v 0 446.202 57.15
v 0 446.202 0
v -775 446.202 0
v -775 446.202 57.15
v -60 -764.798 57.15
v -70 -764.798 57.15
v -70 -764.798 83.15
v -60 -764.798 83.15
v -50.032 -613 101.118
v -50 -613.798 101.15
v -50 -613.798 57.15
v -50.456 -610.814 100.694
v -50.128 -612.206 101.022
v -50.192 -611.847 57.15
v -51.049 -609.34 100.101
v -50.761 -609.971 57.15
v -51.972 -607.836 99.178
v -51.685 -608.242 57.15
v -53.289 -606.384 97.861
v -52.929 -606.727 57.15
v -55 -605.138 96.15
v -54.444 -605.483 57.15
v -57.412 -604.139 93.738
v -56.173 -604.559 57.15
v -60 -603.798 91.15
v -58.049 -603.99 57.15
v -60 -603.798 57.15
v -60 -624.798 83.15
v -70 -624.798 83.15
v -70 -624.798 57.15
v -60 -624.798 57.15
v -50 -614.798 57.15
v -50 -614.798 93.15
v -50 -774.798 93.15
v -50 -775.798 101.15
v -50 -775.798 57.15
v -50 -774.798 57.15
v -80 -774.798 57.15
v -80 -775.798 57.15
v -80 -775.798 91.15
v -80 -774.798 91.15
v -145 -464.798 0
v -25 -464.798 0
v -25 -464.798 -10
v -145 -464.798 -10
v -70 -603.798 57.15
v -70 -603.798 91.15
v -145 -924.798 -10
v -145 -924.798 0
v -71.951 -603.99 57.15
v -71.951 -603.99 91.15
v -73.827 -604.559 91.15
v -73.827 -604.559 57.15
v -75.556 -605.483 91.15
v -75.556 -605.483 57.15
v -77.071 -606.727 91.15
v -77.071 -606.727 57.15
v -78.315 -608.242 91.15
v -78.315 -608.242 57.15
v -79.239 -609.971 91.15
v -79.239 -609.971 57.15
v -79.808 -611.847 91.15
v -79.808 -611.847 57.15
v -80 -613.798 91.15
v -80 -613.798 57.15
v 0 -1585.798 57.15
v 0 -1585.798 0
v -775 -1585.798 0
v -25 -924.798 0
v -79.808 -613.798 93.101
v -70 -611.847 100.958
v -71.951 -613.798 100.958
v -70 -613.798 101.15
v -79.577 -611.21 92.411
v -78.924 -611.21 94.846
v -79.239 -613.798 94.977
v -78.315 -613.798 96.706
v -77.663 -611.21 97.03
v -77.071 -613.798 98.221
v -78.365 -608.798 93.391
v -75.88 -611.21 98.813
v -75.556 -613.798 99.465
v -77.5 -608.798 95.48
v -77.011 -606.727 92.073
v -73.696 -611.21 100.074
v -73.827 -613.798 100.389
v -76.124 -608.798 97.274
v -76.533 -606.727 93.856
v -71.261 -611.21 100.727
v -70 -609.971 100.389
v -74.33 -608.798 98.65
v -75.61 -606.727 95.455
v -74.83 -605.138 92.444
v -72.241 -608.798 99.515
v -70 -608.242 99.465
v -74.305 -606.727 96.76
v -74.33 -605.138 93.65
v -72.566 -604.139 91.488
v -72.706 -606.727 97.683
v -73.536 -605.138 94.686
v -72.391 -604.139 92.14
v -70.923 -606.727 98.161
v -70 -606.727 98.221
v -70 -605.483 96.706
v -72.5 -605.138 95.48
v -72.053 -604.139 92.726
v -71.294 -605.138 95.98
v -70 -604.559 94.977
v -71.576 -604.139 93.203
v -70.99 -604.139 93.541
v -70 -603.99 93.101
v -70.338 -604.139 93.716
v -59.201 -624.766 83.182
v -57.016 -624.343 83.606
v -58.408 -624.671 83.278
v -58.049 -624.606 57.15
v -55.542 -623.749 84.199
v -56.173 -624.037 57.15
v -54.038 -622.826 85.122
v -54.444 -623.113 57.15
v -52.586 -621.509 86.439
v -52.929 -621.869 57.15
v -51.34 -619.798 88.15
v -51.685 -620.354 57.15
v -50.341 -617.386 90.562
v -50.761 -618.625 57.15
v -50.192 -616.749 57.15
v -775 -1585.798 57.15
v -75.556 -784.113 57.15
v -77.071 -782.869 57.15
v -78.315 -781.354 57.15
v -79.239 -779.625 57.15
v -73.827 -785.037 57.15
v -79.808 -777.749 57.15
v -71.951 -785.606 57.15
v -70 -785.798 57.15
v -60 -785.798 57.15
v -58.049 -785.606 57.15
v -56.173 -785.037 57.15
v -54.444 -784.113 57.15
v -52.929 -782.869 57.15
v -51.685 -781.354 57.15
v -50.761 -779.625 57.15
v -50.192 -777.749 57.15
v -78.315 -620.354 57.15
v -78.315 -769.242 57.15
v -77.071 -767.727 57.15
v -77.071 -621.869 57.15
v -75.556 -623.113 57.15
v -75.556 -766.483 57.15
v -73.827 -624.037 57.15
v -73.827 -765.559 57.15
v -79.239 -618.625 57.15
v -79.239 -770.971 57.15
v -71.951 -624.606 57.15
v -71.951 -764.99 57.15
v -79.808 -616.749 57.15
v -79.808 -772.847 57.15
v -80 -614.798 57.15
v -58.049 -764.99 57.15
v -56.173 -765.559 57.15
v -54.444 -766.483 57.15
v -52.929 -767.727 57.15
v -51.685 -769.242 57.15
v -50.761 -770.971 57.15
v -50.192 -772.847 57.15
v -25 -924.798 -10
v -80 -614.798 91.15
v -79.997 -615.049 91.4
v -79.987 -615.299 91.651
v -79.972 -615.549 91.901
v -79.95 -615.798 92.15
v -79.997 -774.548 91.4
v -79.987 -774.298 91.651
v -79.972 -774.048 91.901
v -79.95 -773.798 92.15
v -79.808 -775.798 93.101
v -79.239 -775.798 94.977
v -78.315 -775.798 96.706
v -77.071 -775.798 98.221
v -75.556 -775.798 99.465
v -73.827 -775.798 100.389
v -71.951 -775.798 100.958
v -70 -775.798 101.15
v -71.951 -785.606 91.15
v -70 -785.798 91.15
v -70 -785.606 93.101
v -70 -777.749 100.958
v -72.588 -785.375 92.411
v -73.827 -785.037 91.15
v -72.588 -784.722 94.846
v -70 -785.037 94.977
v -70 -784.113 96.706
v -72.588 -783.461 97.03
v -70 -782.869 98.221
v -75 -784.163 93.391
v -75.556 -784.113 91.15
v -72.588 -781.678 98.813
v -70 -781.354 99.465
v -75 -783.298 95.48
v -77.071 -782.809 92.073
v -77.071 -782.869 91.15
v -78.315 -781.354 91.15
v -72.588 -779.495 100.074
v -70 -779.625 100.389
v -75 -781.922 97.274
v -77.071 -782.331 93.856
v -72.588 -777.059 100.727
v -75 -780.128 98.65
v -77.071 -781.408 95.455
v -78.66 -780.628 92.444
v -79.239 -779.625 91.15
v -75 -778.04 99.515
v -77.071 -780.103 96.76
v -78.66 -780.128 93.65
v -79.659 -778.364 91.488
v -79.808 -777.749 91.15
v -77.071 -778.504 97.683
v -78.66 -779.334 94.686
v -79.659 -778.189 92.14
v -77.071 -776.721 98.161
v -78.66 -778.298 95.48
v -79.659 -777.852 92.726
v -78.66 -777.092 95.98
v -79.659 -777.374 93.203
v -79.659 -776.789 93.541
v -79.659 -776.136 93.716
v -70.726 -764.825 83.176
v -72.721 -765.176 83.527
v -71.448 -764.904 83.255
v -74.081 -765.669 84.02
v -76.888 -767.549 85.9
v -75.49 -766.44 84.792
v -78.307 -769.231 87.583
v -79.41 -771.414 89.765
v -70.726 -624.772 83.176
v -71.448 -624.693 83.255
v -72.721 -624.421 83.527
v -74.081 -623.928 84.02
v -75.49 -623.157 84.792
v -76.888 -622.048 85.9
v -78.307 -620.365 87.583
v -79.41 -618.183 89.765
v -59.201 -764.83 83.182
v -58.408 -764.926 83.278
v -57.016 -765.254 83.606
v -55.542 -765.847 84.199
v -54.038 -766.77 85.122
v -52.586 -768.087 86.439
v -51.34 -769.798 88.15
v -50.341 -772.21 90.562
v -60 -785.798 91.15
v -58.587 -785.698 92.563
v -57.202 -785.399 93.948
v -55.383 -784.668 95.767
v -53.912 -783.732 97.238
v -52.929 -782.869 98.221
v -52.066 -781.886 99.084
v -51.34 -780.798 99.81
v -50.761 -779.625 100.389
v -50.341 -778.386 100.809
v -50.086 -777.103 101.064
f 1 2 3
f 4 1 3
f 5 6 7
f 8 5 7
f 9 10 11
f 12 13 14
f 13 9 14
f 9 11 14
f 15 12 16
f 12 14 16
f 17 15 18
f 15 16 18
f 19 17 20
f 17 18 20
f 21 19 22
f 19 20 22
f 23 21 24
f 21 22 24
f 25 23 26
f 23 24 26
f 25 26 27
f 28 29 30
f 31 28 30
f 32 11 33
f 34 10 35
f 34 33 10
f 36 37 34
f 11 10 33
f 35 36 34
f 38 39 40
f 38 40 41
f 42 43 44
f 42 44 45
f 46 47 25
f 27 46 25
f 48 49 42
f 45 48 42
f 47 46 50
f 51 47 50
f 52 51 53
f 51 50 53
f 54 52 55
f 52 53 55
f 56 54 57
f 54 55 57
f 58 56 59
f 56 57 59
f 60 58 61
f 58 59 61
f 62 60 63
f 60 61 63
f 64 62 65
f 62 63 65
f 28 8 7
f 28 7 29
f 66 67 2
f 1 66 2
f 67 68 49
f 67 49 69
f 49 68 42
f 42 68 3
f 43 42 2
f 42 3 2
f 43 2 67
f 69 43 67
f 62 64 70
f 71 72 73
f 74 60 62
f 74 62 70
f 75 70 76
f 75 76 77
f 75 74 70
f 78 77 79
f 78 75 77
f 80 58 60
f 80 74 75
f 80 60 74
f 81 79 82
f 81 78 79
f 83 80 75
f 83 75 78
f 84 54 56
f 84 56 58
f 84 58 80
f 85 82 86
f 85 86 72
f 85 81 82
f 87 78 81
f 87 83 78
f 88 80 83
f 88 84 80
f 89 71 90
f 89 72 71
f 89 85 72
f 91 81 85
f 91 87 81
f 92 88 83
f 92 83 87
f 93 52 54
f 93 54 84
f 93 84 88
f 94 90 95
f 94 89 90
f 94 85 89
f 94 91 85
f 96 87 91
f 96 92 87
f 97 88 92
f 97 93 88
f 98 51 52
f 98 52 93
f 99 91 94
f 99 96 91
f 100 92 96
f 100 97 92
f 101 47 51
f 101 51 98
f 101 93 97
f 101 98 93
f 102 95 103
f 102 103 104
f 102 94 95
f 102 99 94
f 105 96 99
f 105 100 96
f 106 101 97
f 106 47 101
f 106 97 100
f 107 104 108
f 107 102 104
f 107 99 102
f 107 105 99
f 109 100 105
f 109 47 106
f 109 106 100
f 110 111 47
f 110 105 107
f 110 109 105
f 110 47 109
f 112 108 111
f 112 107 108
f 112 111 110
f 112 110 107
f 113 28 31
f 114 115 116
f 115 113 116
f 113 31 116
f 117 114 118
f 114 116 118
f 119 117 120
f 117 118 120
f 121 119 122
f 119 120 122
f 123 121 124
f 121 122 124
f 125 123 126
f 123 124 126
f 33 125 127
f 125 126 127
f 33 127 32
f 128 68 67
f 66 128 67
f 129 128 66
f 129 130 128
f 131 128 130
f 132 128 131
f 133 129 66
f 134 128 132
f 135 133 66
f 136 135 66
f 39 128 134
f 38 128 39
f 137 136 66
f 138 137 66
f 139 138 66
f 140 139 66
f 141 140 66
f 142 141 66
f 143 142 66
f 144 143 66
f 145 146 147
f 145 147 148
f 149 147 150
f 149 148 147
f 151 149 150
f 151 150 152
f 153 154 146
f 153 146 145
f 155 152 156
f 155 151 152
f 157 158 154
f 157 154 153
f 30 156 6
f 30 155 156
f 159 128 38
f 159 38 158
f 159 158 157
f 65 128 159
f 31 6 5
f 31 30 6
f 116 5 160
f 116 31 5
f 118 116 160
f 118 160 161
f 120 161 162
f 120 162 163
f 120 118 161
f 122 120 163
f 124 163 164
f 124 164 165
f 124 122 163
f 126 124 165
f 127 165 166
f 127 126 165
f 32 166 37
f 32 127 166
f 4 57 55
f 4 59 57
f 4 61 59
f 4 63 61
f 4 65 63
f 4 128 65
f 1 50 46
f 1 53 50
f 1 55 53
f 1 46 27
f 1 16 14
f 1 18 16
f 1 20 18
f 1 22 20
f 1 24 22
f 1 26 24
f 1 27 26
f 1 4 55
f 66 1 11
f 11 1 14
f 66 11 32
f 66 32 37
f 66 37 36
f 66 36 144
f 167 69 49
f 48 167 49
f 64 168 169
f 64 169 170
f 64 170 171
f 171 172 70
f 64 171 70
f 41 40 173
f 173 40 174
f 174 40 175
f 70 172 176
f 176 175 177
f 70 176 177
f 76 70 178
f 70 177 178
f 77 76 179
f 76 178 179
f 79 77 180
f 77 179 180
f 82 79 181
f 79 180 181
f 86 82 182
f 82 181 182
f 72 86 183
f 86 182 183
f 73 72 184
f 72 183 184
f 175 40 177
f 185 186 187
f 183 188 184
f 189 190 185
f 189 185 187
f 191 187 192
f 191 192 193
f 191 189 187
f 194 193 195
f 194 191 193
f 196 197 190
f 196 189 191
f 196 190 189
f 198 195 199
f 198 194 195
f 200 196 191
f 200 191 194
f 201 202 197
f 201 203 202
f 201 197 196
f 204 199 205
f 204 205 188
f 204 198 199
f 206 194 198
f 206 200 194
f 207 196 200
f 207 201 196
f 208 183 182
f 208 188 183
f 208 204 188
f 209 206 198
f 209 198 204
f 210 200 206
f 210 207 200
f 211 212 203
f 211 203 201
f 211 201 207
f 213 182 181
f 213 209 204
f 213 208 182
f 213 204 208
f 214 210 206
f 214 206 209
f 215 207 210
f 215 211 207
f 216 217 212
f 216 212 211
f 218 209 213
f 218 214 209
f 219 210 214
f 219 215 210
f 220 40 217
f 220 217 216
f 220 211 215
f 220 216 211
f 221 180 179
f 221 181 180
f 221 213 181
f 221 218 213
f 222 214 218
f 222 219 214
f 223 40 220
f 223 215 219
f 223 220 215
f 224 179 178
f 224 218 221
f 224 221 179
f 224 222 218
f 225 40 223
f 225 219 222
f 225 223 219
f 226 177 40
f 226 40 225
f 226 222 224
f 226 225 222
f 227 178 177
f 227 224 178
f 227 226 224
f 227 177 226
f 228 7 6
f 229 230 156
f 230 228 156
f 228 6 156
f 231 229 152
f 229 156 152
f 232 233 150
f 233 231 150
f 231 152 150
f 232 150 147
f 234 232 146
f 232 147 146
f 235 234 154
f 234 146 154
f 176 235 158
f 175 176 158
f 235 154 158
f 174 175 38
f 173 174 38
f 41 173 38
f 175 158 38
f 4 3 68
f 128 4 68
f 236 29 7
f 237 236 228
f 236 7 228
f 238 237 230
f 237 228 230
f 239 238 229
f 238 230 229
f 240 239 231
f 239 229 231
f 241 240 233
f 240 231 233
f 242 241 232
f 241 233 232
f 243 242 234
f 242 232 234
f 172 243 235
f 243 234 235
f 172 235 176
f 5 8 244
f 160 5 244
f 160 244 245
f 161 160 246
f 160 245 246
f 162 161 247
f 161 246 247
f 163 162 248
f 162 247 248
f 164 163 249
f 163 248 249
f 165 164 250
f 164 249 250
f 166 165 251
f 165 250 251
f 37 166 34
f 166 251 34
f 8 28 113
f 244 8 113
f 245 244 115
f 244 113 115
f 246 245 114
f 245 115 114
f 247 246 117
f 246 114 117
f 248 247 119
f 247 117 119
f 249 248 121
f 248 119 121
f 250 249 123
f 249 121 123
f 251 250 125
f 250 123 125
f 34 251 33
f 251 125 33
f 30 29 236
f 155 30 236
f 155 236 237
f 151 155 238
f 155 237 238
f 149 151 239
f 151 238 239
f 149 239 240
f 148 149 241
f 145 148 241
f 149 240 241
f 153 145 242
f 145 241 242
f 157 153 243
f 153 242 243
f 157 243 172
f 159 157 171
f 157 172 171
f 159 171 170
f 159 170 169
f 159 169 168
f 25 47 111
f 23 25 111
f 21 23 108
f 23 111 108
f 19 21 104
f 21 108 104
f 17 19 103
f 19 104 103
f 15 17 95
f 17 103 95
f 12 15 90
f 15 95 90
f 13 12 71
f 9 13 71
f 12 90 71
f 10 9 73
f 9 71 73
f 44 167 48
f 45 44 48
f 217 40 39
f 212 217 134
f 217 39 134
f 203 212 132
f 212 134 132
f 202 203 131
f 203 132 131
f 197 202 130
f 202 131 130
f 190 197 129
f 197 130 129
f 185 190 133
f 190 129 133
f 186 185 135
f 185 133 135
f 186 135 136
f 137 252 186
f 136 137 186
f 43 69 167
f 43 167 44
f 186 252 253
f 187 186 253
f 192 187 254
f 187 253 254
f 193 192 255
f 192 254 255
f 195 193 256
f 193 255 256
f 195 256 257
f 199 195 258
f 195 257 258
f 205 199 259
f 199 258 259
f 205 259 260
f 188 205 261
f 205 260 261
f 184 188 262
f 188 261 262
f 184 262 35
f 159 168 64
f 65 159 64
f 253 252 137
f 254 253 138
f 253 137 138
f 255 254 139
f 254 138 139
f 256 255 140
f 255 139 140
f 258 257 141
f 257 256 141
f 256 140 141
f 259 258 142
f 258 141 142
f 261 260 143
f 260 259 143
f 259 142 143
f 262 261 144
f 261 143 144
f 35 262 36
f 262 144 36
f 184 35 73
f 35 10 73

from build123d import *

# Parameters (mm, degrees)
BOSS_EXTRUDE2_DEPTH = 57.15
BOSS_EXTRUDE3_DEPTH = 44
CUT_EXTRUDE1_DEPTH  = 44
FILLET1_R           = 10
SKETCH6_W           = 120
SKETCH6_H           = 460.0000000000001
BOSS_EXTRUDE4_DEPTH = 10


with BuildPart() as part:
    # Sketch1 → Boss-Extrude2 (new body)
    with BuildSketch(Plane.XY):
        Polygon((0, 0), (0, 446.2018372120283), (-775, 446.2018372120282), (-774.9999999999995, -1585.7981627879717), (0, -1585.7981627879717), align=None)
    extrude(amount=BOSS_EXTRUDE2_DEPTH)

    # Sketch4 → Boss-Extrude3 (add)
    with BuildSketch(Plane.XY.offset(57.15)):
        Polygon((-79.99999999999993, -603.7981627879718), (-49.999999999999936, -603.7981627879718), (-49.999999999999915, -785.7981627879718), (-79.9999999999999, -785.7981627879718), align=None)
    extrude(amount=BOSS_EXTRUDE3_DEPTH)

    # Sketch5 → Cut-Extrude1 (cut)
    with BuildSketch(Plane.ZY.offset(80.00000000000003)):
        Polygon((83.14999999999999, -624.7981627879717), (57.150000000000006, -624.7981627879717), (57.15, -764.7981627879717), (83.15, -764.7981627879717), align=None)
    extrude(amount=-CUT_EXTRUDE1_DEPTH, mode=Mode.SUBTRACT)

    # Fillet1
    # the kernel refuses this fillet: 10 mm, written as the material it takes off along each edge
    with BuildSketch(Plane(origin=(-69.99999999999993, -613.7981627879718, 91.15), x_dir=(-1, -1.6e-16, 0), z_dir=(0, 1, 0))) as fillet1_piece_1_section:
        Polygon((0, 0), (FILLET1_R, 0), (FILLET1_R, FILLET1_R), (0, FILLET1_R), align=None)
    fillet1_piece_1 = extrude(amount=FILLET1_R, mode=Mode.PRIVATE)
    fillet1_piece_1 = fillet1_piece_1 - Plane(origin=(-69.99999999999993, -613.7981627879718, 91.15), x_dir=(0.7071067811865475, 0, -0.7071067811865475), z_dir=(0, 1, 0)) * Sphere(FILLET1_R, mode=Mode.PRIVATE)
    add(fillet1_piece_1, mode=Mode.SUBTRACT)
    with BuildSketch(Plane(origin=(-69.9999999999999, -775.7981627879718, 91.15), x_dir=(0, 0, 1), z_dir=(-1, -1.6e-16, 0))) as fillet1_piece_2_section:
        Polygon((0, 0), (FILLET1_R, 0), (FILLET1_R, -FILLET1_R), (0, -FILLET1_R), align=None)
    fillet1_piece_2 = extrude(amount=FILLET1_R, mode=Mode.PRIVATE)
    fillet1_piece_2 = fillet1_piece_2 - Plane(origin=(-69.9999999999999, -775.7981627879718, 91.15), x_dir=(0, 0.7071067811865475, -0.7071067811865475), z_dir=(-1, -1.6e-16, 0)) * Sphere(FILLET1_R, mode=Mode.PRIVATE)
    add(fillet1_piece_2, mode=Mode.SUBTRACT)
    with BuildSketch(Plane(origin=(-49.999999999999915, -785.7981627879718, 57.15), x_dir=(-1, 0, 0), z_dir=(0, 0, 1))) as fillet1_piece_3:
        with BuildLine():
            CenterArc((FILLET1_R, -FILLET1_R), FILLET1_R, 90, 90)
            Line((0, -FILLET1_R), (0, 0))
            Line((0, 0), (FILLET1_R, 0))
        make_face()
    extrude(amount=69, mode=Mode.SUBTRACT)
    with BuildSketch(Plane(origin=(-49.999999999999936, -603.7981627879718, 57.15), x_dir=(0, -1, 0), z_dir=(0, 0, 1))) as fillet1_piece_4:
        with BuildLine():
            CenterArc((FILLET1_R, -FILLET1_R), FILLET1_R, 90, 90)
            Line((0, -FILLET1_R), (0, 0))
            Line((0, 0), (FILLET1_R, 0))
        make_face()
    extrude(amount=69, mode=Mode.SUBTRACT)
    with BuildSketch(Plane(origin=(-79.99999999999993, -603.7981627879718, 57.15), x_dir=(1, 0, 0), z_dir=(0, 0, 1))) as fillet1_piece_5:
        with BuildLine():
            CenterArc((FILLET1_R, -FILLET1_R), FILLET1_R, 90, 90)
            Line((0, -FILLET1_R), (0, 0))
            Line((0, 0), (FILLET1_R, 0))
        make_face()
    extrude(amount=34.00000000000001, mode=Mode.SUBTRACT)
    with BuildSketch(Plane(origin=(-79.9999999999999, -785.7981627879718, 57.15), x_dir=(1, 0, 0), z_dir=(0, 0, 1))) as fillet1_piece_6:
        with BuildLine():
            CenterArc((FILLET1_R, FILLET1_R), FILLET1_R, 180, 90)
            Line((0, FILLET1_R), (0, 0))
            Line((0, 0), (FILLET1_R, 0))
        make_face()
    extrude(amount=34.00000000000001, mode=Mode.SUBTRACT)
    with BuildSketch(Plane(origin=(-69.99999999999993, -603.7981627879718, 101.15), x_dir=(0, 0, -1), z_dir=(1, 0, 0))) as fillet1_piece_7:
        with BuildLine():
            CenterArc((FILLET1_R, -FILLET1_R), FILLET1_R, 90, 90)
            Line((0, -FILLET1_R), (0, 0))
            Line((0, 0), (FILLET1_R, 0))
        make_face()
    extrude(amount=44.99999999999999, mode=Mode.SUBTRACT)
    with BuildSketch(Plane(origin=(-79.9999999999999, -775.7981627879718, 101.15), x_dir=(0, 0, -1), z_dir=(-1.6e-16, 1, 0))) as fillet1_piece_8:
        with BuildLine():
            CenterArc((FILLET1_R, -FILLET1_R), FILLET1_R, 90, 90)
            Line((0, -FILLET1_R), (0, 0))
            Line((0, 0), (FILLET1_R, 0))
        make_face()
    extrude(amount=162, mode=Mode.SUBTRACT)
    with BuildSketch(Plane(origin=(-24.999999999999915, -785.7981627879718, 101.15), x_dir=(0, 0, -1), z_dir=(-1, 0, 0))) as fillet1_piece_9:
        with BuildLine():
            CenterArc((FILLET1_R, -FILLET1_R), FILLET1_R, 90, 90)
            Line((0, -FILLET1_R), (0, 0))
            Line((0, 0), (FILLET1_R, 0))
        make_face()
    extrude(amount=44.999999999999986, mode=Mode.SUBTRACT)
    with BuildSketch(Plane(origin=(-79.99999999999991, -764.7981627879717, 57.15000000000002), x_dir=(1.42e-15, -1, 0), z_dir=(0, 0, 1))) as fillet1_piece_10:
        with BuildLine():
            CenterArc((FILLET1_R, FILLET1_R), FILLET1_R, 180, 89.99999999999989)
            Line((1.421e-14, FILLET1_R), (0, 0))
            Line((0, 0), (FILLET1_R, 0))
        make_face()
    extrude(amount=25.999999999999986, mode=Mode.SUBTRACT)
    with BuildSketch(Plane(origin=(-79.99999999999993, -624.7981627879717, 83.14999999999999), x_dir=(0, 1, 0), z_dir=(0, 0, -1))) as fillet1_piece_11:
        with BuildLine():
            CenterArc((FILLET1_R, FILLET1_R), FILLET1_R, 180, 90)
            Line((0, FILLET1_R), (0, 0))
            Line((0, 0), (FILLET1_R, 0))
        make_face()
    extrude(amount=25.999999999999986, mode=Mode.SUBTRACT)
    with BuildSketch(Plane(origin=(-79.99999999999991, -764.7981627879717, 83.15), x_dir=(1.42e-15, 1e-16, 1), z_dir=(-1.5e-16, 1, -1e-16))) as fillet1_piece_12:
        with BuildLine():
            CenterArc((FILLET1_R, FILLET1_R), FILLET1_R, 180, 89.99999999999989)
            Line((1.421e-14, FILLET1_R), (0, 0))
            Line((0, 0), (FILLET1_R, 0))
        make_face()
    extrude(amount=140, mode=Mode.SUBTRACT)
    with BuildSketch(Plane(origin=(-49.999999999999915, -764.7981627879717, 83.15), x_dir=(0, -1, 0), z_dir=(0, 0, -1))) as fillet1_piece_13:
        with BuildLine():
            CenterArc((FILLET1_R, FILLET1_R), FILLET1_R, 180, 90)
            Line((0, FILLET1_R), (0, 0))
            Line((0, 0), (FILLET1_R, 0))
        make_face()
    extrude(amount=26, mode=Mode.SUBTRACT)
    with BuildSketch(Plane(origin=(-49.999999999999936, -624.7981627879717, 57.150000000000006), x_dir=(0, 1, 0), z_dir=(0, 0, 1))) as fillet1_piece_14:
        with BuildLine():
            CenterArc((FILLET1_R, FILLET1_R), FILLET1_R, 180.00000000000003, 90)
            Line((0, FILLET1_R), (0, 0))
            Line((0, 0), (FILLET1_R, 0))
        make_face()
    extrude(amount=25.999999999999986, mode=Mode.SUBTRACT)
    with BuildSketch(Plane(origin=(-49.999999999999936, -624.7981627879717, 83.15), x_dir=(0, 1e-16, 1), z_dir=(1.2e-16, -1, 1e-16))) as fillet1_piece_15:
        with BuildLine():
            CenterArc((FILLET1_R, FILLET1_R), FILLET1_R, 180, 90)
            Line((0, FILLET1_R), (0, 0))
            Line((0, 0), (FILLET1_R, 0))
        make_face()
    extrude(amount=140, mode=Mode.SUBTRACT)
    with BuildSketch(Plane(origin=(-79.99999999999991, -764.7981627879717, 57.15000000000002), x_dir=(1.42e-15, -1, 0), z_dir=(0, 0, 1))) as fillet1_piece_16a_section:
        with BuildLine():
            CenterArc((FILLET1_R, FILLET1_R), FILLET1_R, 180, 89.99999999999989)
            Line((1.421e-14, FILLET1_R), (0, 0))
            Line((0, 0), (FILLET1_R, 0))
        make_face()
    fillet1_piece_16a = extrude(amount=50.999999999999986, mode=Mode.PRIVATE)
    fillet1_piece_16a = split(fillet1_piece_16a, bisect_by=Plane(origin=(-77.7360488573316, -767.0621139306398, 83.15), z_dir=(0, 1e-16, 1)), keep=Keep.TOP, mode=Mode.PRIVATE)
    with BuildSketch(Plane(origin=(-79.9999999999999, -789.7981627879717, 83.15), x_dir=(0, 1e-16, 1), z_dir=(-1.5e-16, 1, -1e-16))) as fillet1_piece_16b_section:
        with BuildLine():
            CenterArc((FILLET1_R, FILLET1_R), FILLET1_R, 180, 90)
            Line((0, FILLET1_R), (0, 0))
            Line((0, 0), (FILLET1_R, 0))
        make_face()
    fillet1_piece_16b = extrude(amount=165, mode=Mode.PRIVATE)
    fillet1_piece_16b = split(fillet1_piece_16b, bisect_by=Plane(origin=(-77.73604885733165, -764.7981627879717, 85.41395114266827), z_dir=(1.5e-16, -1, 0)), keep=Keep.TOP, mode=Mode.PRIVATE)
    fillet1_piece_16 = fillet1_piece_16a & fillet1_piece_16b
    add(fillet1_piece_16, mode=Mode.SUBTRACT)
    with BuildSketch(Plane(origin=(-79.99999999999991, -764.7981627879717, 83.15), x_dir=(1.42e-15, 1e-16, 1), z_dir=(-1.5e-16, 1, -1e-16))) as fillet1_piece_17a_section:
        with BuildLine():
            CenterArc((FILLET1_R, FILLET1_R), FILLET1_R, 180, 89.99999999999989)
            Line((1.421e-14, FILLET1_R), (0, 0))
            Line((0, 0), (FILLET1_R, 0))
        make_face()
    fillet1_piece_17a = extrude(amount=165, mode=Mode.PRIVATE)
    fillet1_piece_17a = split(fillet1_piece_17a, bisect_by=Plane(origin=(-77.73604885733167, -624.7981627879717, 85.41395114266825), z_dir=(-1.5e-16, 1, 0)), keep=Keep.TOP, mode=Mode.PRIVATE)
    with BuildSketch(Plane(origin=(-79.99999999999993, -624.7981627879717, 108.14999999999998), x_dir=(0, 1, 0), z_dir=(0, 0, -1))) as fillet1_piece_17b_section:
        with BuildLine():
            CenterArc((FILLET1_R, FILLET1_R), FILLET1_R, 180, 90)
            Line((0, FILLET1_R), (0, 0))
            Line((0, 0), (FILLET1_R, 0))
        make_face()
    fillet1_piece_17b = extrude(amount=50.999999999999986, mode=Mode.PRIVATE)
    fillet1_piece_17b = split(fillet1_piece_17b, bisect_by=Plane(origin=(-77.73604885733164, -622.5342116453035, 83.14999999999999), z_dir=(0, 1e-16, 1)), keep=Keep.TOP, mode=Mode.PRIVATE)
    fillet1_piece_17 = fillet1_piece_17a & fillet1_piece_17b
    add(fillet1_piece_17, mode=Mode.SUBTRACT)
    with BuildSketch(Plane(origin=(-49.999999999999936, -624.7981627879717, 83.15), x_dir=(0, 1e-16, 1), z_dir=(1.2e-16, -1, 1e-16))) as fillet1_piece_18a_section:
        with BuildLine():
            CenterArc((FILLET1_R, FILLET1_R), FILLET1_R, 180, 90)
            Line((0, FILLET1_R), (0, 0))
            Line((0, 0), (FILLET1_R, 0))
        make_face()
    fillet1_piece_18a = extrude(amount=165, mode=Mode.PRIVATE)
    fillet1_piece_18a = split(fillet1_piece_18a, bisect_by=Plane(origin=(-52.26395114266817, -764.7981627879717, 85.41395114266827), z_dir=(1.5e-16, -1, 0)), keep=Keep.TOP, mode=Mode.PRIVATE)
    with BuildSketch(Plane(origin=(-49.999999999999915, -764.7981627879717, 108.15), x_dir=(0, -1, 0), z_dir=(0, 0, -1))) as fillet1_piece_18b_section:
        with BuildLine():
            CenterArc((FILLET1_R, FILLET1_R), FILLET1_R, 180, 90)
            Line((0, FILLET1_R), (0, 0))
            Line((0, 0), (FILLET1_R, 0))
        make_face()
    fillet1_piece_18b = extrude(amount=51, mode=Mode.PRIVATE)
    fillet1_piece_18b = split(fillet1_piece_18b, bisect_by=Plane(origin=(-52.2639511426682, -767.0621139306397, 83.15), z_dir=(0, 1e-16, 1)), keep=Keep.TOP, mode=Mode.PRIVATE)
    fillet1_piece_18 = fillet1_piece_18a & fillet1_piece_18b
    add(fillet1_piece_18, mode=Mode.SUBTRACT)
    with BuildSketch(Plane(origin=(-49.999999999999936, -624.7981627879717, 57.150000000000006), x_dir=(0, 1, 0), z_dir=(0, 0, 1))) as fillet1_piece_19a_section:
        with BuildLine():
            CenterArc((FILLET1_R, FILLET1_R), FILLET1_R, 180.00000000000003, 90)
            Line((0, FILLET1_R), (0, 0))
            Line((0, 0), (FILLET1_R, 0))
        make_face()
    fillet1_piece_19a = extrude(amount=50.999999999999986, mode=Mode.PRIVATE)
    fillet1_piece_19a = split(fillet1_piece_19a, bisect_by=Plane(origin=(-52.26395114266823, -622.5342116453035, 83.14999999999999), z_dir=(0, 1e-16, 1)), keep=Keep.TOP, mode=Mode.PRIVATE)
    with BuildSketch(Plane(origin=(-49.999999999999936, -599.7981627879717, 83.14999999999999), x_dir=(0, 1e-16, 1), z_dir=(1.2e-16, -1, 1e-16))) as fillet1_piece_19b_section:
        with BuildLine():
            CenterArc((FILLET1_R, FILLET1_R), FILLET1_R, 179.99999999999997, 90)
            Line((0, FILLET1_R), (0, 0))
            Line((0, 0), (FILLET1_R, 0))
        make_face()
    fillet1_piece_19b = extrude(amount=165, mode=Mode.PRIVATE)
    fillet1_piece_19b = split(fillet1_piece_19b, bisect_by=Plane(origin=(-52.26395114266818, -624.7981627879717, 85.41395114266824), z_dir=(-1.5e-16, 1, 0)), keep=Keep.TOP, mode=Mode.PRIVATE)
    fillet1_piece_19 = fillet1_piece_19a & fillet1_piece_19b
    add(fillet1_piece_19, mode=Mode.SUBTRACT)

    # Sketch6 → Boss-Extrude4 (add)
    with BuildSketch(Plane(origin=(0, 0, 0), x_dir=(-1, 0, 0), z_dir=(0, 0, -1))):
        with Locations((85, -694.7981627879719)):
            Rectangle(SKETCH6_W, SKETCH6_H)
    extrude(amount=BOSS_EXTRUDE4_DEPTH)


solid = part.part
